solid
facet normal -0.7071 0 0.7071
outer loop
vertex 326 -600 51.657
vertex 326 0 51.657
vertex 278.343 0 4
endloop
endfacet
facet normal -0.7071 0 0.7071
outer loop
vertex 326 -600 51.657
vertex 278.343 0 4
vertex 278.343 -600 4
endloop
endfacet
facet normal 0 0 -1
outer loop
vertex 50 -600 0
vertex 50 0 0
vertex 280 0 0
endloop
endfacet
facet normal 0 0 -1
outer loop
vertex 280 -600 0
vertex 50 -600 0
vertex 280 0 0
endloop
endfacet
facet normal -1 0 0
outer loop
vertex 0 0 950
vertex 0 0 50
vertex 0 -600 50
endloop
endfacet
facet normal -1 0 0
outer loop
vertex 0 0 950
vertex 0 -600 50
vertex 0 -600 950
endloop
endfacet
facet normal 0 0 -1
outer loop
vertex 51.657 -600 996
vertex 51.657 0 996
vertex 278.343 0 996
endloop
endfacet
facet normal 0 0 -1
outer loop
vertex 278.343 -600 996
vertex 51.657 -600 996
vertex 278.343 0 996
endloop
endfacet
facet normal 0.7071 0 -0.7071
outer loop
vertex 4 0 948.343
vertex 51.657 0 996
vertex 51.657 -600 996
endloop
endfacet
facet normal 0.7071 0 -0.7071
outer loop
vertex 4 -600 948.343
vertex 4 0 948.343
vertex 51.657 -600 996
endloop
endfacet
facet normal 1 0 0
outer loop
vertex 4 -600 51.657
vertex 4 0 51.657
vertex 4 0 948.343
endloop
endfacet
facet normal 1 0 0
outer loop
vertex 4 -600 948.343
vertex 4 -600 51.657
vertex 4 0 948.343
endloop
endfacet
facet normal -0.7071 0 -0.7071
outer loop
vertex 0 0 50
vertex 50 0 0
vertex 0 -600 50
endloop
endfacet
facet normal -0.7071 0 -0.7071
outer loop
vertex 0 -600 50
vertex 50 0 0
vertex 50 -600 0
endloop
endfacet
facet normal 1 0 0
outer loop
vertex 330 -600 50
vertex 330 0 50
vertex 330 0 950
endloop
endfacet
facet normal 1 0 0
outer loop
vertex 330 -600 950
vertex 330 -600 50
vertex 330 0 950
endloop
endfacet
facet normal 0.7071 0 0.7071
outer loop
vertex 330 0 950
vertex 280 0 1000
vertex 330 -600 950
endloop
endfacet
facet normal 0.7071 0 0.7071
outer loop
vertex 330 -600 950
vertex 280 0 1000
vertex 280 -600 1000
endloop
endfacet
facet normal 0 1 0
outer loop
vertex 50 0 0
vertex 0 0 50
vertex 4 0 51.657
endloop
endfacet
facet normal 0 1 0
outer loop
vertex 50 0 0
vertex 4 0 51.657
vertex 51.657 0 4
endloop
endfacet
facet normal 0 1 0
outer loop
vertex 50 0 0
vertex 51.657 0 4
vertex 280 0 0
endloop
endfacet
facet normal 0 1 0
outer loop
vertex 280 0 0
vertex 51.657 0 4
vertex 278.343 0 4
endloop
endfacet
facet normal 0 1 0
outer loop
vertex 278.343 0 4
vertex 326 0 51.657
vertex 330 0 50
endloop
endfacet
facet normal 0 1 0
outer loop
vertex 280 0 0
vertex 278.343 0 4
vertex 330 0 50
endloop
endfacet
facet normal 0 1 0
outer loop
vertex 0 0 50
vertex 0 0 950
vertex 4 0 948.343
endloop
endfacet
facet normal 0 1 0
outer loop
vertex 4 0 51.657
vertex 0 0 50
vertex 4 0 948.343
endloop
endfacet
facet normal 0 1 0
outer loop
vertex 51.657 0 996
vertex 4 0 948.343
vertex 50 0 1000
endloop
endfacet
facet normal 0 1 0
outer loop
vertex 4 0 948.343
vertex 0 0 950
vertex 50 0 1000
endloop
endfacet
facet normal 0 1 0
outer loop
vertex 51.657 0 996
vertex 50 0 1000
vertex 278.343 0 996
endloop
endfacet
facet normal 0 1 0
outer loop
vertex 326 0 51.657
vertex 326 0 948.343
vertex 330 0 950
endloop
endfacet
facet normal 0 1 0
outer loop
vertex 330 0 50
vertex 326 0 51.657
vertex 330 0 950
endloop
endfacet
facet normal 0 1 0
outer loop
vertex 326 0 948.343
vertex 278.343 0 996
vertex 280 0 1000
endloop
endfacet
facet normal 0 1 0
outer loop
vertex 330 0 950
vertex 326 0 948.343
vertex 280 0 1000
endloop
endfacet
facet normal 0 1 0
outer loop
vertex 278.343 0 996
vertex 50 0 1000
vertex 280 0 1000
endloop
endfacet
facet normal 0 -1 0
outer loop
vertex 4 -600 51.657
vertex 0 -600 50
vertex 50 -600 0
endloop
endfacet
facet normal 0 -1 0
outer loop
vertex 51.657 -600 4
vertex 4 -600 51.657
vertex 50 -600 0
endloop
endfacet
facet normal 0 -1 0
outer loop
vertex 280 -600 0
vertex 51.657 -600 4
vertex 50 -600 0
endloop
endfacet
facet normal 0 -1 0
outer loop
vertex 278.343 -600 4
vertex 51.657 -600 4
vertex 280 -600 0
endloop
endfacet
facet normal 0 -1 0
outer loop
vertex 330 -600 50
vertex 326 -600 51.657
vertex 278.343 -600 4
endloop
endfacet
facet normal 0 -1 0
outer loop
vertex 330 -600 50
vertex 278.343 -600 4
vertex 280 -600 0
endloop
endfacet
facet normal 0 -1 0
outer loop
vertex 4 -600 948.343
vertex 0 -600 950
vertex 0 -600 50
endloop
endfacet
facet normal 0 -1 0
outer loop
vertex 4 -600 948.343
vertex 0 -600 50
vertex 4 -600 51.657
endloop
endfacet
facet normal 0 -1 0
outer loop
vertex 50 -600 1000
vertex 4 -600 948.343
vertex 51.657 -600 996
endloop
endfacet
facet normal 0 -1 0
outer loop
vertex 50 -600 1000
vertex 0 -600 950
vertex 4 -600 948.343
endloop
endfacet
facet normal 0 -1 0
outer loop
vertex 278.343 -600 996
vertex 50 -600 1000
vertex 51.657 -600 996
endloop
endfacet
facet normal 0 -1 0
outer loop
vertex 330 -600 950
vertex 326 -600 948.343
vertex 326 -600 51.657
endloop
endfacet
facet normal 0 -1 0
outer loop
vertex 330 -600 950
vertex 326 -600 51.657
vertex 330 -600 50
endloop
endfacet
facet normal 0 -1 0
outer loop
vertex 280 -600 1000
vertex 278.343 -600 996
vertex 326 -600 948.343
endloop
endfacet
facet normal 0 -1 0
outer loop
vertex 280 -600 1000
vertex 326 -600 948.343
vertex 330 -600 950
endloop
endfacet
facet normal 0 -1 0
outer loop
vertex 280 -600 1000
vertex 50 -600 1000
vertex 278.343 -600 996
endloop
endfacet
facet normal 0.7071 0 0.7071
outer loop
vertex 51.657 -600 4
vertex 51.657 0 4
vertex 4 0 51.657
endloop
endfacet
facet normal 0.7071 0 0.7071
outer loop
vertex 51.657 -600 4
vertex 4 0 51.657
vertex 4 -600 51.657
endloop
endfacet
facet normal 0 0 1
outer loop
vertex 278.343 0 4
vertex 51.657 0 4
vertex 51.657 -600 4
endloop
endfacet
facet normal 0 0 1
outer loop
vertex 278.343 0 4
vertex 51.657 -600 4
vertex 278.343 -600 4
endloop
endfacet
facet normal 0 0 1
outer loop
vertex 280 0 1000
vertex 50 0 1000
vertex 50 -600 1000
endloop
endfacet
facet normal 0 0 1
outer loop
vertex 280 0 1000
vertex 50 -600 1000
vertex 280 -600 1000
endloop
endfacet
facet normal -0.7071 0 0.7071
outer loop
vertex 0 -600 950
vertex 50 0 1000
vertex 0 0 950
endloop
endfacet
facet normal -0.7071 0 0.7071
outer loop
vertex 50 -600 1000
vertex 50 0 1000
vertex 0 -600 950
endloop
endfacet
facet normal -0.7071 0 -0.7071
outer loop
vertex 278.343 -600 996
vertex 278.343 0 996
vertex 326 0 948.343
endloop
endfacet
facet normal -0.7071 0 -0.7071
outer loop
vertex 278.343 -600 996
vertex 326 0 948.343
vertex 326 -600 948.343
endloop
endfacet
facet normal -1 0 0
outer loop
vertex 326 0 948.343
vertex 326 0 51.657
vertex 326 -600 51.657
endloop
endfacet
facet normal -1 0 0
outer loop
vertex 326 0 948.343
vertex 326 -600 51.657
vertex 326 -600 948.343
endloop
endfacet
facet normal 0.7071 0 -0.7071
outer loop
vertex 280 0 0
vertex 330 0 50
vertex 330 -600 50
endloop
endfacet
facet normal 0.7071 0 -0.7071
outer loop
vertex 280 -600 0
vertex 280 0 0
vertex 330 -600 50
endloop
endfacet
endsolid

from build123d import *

# Parameters (mm, degrees)
F0_W     = 330
F0_H     = 1000
F1_DEPTH = 600
F2_SIZE  = 50
F3_T     = -4


with BuildPart() as f1:
    # F0 (on Front) → F1 (new body)
    with BuildSketch(Plane.XZ):
        with Locations((165, 500)):
            Rectangle(F0_W, F0_H)
    extrude(amount=F1_DEPTH)

    # F2
    f2_edges = [f1.edges().sort_by_distance(p)[0] for p in [
        (0, -300, 1000),
        (330, -300, 1000),
        (0, -300, 0),
        (330, -300, 0),
    ]]
    chamfer(f2_edges, length=F2_SIZE)

    # F3
    f3_openings = [f1.faces().sort_by_distance(p)[0] for p in [
        (165, -600, 500),
        (165, 0, 500),
    ]]
    offset(amount=F3_T, openings=f3_openings)


solid = f1.part
